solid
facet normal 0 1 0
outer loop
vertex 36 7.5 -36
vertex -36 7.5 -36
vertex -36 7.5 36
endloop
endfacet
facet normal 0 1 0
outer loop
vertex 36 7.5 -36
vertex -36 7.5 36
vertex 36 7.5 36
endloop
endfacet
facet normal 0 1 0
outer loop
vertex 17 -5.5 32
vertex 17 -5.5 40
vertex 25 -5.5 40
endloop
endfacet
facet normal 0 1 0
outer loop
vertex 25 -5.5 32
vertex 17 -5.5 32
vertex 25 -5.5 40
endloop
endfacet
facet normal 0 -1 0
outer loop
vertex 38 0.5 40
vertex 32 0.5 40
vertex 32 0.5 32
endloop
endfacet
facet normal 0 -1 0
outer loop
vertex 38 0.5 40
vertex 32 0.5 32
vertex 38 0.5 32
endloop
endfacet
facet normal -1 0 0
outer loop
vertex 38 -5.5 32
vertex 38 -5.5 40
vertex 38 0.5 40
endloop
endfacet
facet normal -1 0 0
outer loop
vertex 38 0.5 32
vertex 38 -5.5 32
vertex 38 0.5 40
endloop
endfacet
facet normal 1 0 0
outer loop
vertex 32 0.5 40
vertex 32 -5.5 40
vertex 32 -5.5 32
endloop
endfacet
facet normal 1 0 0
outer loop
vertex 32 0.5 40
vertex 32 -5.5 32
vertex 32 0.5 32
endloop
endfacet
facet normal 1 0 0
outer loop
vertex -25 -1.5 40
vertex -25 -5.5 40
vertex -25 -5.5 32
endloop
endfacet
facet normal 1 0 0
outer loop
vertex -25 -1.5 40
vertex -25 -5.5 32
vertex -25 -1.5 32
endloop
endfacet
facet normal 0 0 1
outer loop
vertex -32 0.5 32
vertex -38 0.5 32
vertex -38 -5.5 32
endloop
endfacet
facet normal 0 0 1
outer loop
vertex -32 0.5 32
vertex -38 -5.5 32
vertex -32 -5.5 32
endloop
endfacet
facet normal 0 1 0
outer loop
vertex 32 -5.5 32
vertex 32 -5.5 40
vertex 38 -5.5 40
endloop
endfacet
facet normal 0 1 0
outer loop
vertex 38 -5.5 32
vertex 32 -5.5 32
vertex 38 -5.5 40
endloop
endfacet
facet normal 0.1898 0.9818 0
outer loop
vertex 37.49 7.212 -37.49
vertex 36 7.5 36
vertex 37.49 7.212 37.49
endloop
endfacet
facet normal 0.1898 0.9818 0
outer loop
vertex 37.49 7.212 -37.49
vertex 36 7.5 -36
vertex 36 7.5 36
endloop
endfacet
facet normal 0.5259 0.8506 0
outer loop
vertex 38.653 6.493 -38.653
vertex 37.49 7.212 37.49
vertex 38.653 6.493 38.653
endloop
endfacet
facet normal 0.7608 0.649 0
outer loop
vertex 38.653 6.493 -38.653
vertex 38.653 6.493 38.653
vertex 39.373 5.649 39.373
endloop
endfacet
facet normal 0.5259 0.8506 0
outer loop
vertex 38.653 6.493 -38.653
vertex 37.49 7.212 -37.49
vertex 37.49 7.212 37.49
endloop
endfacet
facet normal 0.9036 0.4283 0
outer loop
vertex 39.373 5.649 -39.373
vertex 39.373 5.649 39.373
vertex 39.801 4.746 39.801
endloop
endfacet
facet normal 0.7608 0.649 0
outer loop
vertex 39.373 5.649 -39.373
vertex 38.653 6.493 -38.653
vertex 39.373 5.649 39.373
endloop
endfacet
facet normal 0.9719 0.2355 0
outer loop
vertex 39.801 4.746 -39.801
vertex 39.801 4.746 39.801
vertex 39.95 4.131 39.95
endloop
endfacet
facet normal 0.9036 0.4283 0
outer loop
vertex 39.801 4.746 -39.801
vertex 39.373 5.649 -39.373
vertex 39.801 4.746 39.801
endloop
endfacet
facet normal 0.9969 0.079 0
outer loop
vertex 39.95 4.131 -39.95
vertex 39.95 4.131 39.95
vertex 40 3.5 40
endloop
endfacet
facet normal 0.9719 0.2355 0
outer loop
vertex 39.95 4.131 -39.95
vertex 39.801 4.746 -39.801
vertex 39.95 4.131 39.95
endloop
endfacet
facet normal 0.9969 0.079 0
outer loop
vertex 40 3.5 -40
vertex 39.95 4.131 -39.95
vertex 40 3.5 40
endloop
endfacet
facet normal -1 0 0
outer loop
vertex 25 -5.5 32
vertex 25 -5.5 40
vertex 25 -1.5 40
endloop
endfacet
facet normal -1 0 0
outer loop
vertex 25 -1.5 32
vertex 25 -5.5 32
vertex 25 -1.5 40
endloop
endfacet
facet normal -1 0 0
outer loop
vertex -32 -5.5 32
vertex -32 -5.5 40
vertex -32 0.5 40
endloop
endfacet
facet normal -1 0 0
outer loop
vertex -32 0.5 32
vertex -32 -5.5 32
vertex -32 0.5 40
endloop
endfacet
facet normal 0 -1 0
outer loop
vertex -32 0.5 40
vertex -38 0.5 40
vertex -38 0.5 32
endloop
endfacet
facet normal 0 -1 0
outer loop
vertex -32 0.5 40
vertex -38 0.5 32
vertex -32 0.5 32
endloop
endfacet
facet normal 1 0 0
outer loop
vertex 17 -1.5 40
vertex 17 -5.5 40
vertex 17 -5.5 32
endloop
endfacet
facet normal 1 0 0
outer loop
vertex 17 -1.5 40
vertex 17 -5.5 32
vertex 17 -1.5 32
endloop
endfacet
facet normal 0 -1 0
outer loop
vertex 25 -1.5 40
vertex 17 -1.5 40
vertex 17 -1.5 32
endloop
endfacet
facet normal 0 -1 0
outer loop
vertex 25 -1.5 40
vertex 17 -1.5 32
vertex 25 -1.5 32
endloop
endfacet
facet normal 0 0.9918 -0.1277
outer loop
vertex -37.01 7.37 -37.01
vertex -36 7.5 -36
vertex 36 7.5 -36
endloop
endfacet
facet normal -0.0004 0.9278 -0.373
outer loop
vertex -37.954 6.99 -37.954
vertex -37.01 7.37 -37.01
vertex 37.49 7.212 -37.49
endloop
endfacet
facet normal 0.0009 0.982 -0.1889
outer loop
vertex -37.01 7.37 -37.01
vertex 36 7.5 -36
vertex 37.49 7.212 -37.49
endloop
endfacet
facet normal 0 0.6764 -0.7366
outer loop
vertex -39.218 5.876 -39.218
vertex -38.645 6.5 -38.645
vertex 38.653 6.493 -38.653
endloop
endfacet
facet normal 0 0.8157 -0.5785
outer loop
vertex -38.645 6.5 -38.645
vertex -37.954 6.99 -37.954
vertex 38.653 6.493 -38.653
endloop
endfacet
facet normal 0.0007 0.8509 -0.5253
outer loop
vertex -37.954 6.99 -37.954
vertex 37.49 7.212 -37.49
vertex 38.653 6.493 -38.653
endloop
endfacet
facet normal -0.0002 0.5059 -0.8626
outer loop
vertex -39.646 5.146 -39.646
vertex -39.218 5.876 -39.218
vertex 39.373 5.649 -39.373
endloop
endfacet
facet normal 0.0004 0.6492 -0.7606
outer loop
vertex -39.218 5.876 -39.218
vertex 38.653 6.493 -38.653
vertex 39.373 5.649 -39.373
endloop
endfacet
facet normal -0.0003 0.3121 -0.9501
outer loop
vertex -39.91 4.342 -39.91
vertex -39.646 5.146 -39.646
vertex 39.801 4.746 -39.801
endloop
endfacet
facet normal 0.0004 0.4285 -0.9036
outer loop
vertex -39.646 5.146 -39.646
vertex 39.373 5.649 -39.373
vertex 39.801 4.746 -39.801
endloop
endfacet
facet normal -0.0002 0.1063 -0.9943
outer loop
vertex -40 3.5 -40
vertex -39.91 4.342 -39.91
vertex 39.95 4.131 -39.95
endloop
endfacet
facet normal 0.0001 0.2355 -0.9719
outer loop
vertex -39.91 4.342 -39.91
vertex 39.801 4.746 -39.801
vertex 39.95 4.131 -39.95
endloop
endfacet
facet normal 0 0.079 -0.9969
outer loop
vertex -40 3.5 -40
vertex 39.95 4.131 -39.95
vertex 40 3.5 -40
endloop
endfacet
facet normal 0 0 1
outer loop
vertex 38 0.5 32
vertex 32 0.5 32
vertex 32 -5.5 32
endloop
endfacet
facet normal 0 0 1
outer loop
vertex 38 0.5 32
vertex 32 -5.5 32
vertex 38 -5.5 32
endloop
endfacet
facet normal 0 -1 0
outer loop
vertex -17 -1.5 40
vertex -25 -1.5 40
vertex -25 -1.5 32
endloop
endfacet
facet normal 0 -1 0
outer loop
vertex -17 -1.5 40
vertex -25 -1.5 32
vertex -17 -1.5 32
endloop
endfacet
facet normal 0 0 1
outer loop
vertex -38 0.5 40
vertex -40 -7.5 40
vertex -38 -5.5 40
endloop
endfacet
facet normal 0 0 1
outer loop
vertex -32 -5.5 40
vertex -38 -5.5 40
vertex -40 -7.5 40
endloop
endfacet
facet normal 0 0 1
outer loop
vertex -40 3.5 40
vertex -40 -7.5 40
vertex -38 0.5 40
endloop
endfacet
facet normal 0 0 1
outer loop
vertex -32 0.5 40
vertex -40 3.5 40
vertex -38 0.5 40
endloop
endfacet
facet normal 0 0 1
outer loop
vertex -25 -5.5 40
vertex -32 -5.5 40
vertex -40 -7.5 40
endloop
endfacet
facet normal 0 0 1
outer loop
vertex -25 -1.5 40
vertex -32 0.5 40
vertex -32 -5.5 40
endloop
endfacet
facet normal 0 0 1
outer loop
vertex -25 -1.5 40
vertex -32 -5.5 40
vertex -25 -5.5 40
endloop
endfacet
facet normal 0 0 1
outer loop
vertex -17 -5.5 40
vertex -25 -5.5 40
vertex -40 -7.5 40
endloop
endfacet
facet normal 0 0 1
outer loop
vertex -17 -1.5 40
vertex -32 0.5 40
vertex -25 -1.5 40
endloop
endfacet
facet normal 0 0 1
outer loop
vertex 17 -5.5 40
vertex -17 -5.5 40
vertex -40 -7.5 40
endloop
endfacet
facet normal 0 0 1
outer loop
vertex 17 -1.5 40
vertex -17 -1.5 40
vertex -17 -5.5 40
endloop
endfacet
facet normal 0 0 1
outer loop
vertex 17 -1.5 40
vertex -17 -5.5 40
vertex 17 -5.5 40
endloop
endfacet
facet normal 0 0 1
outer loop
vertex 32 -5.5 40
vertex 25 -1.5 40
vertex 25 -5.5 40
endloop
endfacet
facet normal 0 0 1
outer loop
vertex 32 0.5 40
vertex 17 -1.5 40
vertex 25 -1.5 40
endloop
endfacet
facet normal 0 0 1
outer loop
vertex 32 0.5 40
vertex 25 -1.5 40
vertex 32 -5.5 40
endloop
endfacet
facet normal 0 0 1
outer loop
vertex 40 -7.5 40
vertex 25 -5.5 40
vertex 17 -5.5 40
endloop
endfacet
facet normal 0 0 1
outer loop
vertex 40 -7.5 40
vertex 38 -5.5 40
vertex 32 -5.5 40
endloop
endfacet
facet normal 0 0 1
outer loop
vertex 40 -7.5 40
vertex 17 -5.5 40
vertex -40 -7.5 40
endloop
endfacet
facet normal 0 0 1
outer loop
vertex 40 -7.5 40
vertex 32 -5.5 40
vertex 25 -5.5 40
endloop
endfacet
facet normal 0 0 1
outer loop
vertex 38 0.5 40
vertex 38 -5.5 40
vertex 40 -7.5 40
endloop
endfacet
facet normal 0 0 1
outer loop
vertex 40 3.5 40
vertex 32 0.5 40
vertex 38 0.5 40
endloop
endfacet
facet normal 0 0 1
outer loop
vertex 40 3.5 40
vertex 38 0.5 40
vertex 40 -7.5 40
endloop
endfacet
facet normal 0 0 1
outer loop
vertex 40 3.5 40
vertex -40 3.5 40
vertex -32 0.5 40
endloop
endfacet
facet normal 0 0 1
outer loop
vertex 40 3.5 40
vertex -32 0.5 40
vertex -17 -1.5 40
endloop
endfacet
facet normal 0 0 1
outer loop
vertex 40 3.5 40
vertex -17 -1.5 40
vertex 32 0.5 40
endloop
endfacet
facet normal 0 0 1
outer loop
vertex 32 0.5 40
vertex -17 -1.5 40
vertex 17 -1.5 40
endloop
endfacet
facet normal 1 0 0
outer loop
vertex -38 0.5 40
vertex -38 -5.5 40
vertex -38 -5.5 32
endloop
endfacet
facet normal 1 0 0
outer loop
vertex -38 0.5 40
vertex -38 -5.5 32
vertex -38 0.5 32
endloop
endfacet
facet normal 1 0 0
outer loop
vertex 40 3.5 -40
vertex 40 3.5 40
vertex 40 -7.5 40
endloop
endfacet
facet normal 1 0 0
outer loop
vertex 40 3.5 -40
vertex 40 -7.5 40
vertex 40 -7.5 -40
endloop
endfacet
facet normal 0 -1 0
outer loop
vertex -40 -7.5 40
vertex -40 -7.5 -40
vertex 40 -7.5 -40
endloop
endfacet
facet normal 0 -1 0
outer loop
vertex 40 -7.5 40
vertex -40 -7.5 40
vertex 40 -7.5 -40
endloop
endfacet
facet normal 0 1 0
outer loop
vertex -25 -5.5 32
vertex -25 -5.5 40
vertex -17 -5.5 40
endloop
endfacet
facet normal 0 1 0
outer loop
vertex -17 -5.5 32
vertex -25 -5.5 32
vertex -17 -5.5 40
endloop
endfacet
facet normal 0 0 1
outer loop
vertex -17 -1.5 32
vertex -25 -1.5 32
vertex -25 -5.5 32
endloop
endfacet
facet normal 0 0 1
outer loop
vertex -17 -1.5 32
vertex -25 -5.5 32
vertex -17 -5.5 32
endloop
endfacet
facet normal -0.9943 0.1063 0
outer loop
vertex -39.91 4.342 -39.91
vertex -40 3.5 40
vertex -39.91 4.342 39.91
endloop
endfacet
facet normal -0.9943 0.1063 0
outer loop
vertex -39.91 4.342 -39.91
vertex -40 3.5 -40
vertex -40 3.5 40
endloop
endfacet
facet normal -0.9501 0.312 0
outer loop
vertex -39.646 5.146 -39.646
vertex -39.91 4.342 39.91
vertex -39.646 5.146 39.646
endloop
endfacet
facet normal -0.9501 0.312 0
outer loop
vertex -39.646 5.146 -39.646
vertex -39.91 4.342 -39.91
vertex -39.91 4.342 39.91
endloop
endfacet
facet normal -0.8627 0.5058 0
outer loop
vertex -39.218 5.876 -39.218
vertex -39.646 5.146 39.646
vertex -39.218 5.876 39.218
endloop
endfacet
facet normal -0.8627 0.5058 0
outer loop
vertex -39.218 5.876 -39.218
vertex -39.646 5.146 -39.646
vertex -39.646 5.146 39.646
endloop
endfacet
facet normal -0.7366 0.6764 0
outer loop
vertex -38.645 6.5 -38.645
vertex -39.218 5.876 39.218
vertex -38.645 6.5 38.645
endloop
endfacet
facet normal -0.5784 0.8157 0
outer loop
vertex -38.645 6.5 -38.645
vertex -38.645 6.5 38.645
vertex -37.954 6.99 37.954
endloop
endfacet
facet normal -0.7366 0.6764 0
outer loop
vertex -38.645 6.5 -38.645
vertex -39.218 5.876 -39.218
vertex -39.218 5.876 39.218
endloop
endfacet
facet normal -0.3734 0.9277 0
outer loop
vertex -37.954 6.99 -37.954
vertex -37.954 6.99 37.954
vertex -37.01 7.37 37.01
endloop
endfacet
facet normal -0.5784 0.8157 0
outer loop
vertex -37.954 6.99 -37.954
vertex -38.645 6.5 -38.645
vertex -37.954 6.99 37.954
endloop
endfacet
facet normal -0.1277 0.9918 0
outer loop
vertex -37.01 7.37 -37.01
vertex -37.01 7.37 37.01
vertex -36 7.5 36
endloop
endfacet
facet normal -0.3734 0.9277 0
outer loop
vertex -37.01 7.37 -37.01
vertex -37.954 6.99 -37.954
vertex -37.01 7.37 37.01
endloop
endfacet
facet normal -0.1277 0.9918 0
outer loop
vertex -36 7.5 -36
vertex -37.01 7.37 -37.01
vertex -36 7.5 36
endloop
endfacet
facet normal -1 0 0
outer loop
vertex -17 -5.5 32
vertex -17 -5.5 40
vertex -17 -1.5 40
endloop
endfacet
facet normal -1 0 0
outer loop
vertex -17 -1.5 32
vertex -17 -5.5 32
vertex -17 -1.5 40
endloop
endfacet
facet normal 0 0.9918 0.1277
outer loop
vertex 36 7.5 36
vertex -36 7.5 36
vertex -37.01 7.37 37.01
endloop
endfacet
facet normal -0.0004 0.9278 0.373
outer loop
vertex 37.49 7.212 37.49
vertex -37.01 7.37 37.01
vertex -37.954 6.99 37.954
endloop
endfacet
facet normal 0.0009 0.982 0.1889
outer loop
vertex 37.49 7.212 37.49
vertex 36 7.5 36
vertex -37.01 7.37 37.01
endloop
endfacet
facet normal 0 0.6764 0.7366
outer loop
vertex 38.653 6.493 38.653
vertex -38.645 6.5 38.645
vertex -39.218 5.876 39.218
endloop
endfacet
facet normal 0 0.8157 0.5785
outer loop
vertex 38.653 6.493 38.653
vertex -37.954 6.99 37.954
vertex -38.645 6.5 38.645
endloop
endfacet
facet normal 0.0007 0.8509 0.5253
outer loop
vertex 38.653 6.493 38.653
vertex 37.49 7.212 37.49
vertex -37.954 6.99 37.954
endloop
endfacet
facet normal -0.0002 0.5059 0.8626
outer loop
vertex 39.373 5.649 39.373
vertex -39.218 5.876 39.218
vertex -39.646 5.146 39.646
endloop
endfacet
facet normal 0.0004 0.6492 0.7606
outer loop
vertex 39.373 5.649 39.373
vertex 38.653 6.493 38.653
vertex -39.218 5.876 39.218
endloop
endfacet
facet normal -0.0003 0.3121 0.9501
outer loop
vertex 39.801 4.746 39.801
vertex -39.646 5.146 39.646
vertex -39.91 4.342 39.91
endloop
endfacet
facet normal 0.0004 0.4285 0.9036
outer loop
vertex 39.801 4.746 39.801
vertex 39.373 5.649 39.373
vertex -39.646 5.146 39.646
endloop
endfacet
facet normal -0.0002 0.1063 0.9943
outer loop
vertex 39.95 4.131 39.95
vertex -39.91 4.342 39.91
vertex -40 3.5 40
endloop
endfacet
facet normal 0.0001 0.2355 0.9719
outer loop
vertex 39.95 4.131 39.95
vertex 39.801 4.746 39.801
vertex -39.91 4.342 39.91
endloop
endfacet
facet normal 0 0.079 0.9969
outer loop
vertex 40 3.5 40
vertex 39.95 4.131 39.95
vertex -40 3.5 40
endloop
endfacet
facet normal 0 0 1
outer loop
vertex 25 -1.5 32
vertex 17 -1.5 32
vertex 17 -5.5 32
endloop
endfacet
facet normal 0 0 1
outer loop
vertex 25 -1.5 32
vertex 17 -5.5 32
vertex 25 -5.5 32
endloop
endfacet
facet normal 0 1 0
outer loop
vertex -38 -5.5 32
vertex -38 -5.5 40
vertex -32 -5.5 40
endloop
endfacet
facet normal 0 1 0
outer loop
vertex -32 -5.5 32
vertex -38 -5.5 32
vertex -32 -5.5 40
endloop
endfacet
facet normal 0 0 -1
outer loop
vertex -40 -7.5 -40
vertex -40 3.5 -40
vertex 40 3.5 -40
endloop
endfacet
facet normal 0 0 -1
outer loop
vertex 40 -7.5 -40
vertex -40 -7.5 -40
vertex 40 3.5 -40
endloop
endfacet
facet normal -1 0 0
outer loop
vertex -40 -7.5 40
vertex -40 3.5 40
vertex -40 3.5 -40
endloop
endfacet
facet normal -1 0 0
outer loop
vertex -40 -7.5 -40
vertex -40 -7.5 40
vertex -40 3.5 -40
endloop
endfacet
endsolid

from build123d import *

# Parameters (mm, degrees)
SKETCH_1_W          = 80
SKETCH_1_H          = 80
EXTRUDE_1_DEPTH     = 7.5
FILLET_1_R          = 4
SKETCH_2_W          = 6
SKETCH_2_H          = 6
SKETCH_2_W_2        = 8
SKETCH_2_H_2        = 4
CUT_EXTRUDE_1_DEPTH = 8


with BuildPart() as part:
    # 草图1 → 凸台-拉伸1 (new, symmetric)
    with BuildSketch(Plane(origin=(0, 0, 0), x_dir=(1, 0, 0), z_dir=(0, 1, 0))):
        Rectangle(SKETCH_1_W, SKETCH_1_H)
    extrude(amount=EXTRUDE_1_DEPTH, both=True)

    # 圆角1
    fillet_1_edges = [part.edges().sort_by_distance(p)[0] for p in [
        (-40, 7.5, 0),
        (0, 7.5, 40),
        (40, 7.5, 0),
        (0, 7.5, -40),
    ]]
    fillet(fillet_1_edges, radius=FILLET_1_R)

    # 草图2 → 切除-拉伸1 (cut)
    with BuildSketch(Plane.XY.offset(40)):
        with Locations((-35, -2.5)):
            Rectangle(SKETCH_2_W, SKETCH_2_H)
        with Locations((-21, -3.5)):
            Rectangle(SKETCH_2_W_2, SKETCH_2_H_2)
        with Locations((21, -3.5)):
            Rectangle(SKETCH_2_W_2, SKETCH_2_H_2)
        with Locations((35, -2.5)):
            Rectangle(SKETCH_2_W, SKETCH_2_H)
    extrude(amount=-CUT_EXTRUDE_1_DEPTH, mode=Mode.SUBTRACT)


solid = part.part
